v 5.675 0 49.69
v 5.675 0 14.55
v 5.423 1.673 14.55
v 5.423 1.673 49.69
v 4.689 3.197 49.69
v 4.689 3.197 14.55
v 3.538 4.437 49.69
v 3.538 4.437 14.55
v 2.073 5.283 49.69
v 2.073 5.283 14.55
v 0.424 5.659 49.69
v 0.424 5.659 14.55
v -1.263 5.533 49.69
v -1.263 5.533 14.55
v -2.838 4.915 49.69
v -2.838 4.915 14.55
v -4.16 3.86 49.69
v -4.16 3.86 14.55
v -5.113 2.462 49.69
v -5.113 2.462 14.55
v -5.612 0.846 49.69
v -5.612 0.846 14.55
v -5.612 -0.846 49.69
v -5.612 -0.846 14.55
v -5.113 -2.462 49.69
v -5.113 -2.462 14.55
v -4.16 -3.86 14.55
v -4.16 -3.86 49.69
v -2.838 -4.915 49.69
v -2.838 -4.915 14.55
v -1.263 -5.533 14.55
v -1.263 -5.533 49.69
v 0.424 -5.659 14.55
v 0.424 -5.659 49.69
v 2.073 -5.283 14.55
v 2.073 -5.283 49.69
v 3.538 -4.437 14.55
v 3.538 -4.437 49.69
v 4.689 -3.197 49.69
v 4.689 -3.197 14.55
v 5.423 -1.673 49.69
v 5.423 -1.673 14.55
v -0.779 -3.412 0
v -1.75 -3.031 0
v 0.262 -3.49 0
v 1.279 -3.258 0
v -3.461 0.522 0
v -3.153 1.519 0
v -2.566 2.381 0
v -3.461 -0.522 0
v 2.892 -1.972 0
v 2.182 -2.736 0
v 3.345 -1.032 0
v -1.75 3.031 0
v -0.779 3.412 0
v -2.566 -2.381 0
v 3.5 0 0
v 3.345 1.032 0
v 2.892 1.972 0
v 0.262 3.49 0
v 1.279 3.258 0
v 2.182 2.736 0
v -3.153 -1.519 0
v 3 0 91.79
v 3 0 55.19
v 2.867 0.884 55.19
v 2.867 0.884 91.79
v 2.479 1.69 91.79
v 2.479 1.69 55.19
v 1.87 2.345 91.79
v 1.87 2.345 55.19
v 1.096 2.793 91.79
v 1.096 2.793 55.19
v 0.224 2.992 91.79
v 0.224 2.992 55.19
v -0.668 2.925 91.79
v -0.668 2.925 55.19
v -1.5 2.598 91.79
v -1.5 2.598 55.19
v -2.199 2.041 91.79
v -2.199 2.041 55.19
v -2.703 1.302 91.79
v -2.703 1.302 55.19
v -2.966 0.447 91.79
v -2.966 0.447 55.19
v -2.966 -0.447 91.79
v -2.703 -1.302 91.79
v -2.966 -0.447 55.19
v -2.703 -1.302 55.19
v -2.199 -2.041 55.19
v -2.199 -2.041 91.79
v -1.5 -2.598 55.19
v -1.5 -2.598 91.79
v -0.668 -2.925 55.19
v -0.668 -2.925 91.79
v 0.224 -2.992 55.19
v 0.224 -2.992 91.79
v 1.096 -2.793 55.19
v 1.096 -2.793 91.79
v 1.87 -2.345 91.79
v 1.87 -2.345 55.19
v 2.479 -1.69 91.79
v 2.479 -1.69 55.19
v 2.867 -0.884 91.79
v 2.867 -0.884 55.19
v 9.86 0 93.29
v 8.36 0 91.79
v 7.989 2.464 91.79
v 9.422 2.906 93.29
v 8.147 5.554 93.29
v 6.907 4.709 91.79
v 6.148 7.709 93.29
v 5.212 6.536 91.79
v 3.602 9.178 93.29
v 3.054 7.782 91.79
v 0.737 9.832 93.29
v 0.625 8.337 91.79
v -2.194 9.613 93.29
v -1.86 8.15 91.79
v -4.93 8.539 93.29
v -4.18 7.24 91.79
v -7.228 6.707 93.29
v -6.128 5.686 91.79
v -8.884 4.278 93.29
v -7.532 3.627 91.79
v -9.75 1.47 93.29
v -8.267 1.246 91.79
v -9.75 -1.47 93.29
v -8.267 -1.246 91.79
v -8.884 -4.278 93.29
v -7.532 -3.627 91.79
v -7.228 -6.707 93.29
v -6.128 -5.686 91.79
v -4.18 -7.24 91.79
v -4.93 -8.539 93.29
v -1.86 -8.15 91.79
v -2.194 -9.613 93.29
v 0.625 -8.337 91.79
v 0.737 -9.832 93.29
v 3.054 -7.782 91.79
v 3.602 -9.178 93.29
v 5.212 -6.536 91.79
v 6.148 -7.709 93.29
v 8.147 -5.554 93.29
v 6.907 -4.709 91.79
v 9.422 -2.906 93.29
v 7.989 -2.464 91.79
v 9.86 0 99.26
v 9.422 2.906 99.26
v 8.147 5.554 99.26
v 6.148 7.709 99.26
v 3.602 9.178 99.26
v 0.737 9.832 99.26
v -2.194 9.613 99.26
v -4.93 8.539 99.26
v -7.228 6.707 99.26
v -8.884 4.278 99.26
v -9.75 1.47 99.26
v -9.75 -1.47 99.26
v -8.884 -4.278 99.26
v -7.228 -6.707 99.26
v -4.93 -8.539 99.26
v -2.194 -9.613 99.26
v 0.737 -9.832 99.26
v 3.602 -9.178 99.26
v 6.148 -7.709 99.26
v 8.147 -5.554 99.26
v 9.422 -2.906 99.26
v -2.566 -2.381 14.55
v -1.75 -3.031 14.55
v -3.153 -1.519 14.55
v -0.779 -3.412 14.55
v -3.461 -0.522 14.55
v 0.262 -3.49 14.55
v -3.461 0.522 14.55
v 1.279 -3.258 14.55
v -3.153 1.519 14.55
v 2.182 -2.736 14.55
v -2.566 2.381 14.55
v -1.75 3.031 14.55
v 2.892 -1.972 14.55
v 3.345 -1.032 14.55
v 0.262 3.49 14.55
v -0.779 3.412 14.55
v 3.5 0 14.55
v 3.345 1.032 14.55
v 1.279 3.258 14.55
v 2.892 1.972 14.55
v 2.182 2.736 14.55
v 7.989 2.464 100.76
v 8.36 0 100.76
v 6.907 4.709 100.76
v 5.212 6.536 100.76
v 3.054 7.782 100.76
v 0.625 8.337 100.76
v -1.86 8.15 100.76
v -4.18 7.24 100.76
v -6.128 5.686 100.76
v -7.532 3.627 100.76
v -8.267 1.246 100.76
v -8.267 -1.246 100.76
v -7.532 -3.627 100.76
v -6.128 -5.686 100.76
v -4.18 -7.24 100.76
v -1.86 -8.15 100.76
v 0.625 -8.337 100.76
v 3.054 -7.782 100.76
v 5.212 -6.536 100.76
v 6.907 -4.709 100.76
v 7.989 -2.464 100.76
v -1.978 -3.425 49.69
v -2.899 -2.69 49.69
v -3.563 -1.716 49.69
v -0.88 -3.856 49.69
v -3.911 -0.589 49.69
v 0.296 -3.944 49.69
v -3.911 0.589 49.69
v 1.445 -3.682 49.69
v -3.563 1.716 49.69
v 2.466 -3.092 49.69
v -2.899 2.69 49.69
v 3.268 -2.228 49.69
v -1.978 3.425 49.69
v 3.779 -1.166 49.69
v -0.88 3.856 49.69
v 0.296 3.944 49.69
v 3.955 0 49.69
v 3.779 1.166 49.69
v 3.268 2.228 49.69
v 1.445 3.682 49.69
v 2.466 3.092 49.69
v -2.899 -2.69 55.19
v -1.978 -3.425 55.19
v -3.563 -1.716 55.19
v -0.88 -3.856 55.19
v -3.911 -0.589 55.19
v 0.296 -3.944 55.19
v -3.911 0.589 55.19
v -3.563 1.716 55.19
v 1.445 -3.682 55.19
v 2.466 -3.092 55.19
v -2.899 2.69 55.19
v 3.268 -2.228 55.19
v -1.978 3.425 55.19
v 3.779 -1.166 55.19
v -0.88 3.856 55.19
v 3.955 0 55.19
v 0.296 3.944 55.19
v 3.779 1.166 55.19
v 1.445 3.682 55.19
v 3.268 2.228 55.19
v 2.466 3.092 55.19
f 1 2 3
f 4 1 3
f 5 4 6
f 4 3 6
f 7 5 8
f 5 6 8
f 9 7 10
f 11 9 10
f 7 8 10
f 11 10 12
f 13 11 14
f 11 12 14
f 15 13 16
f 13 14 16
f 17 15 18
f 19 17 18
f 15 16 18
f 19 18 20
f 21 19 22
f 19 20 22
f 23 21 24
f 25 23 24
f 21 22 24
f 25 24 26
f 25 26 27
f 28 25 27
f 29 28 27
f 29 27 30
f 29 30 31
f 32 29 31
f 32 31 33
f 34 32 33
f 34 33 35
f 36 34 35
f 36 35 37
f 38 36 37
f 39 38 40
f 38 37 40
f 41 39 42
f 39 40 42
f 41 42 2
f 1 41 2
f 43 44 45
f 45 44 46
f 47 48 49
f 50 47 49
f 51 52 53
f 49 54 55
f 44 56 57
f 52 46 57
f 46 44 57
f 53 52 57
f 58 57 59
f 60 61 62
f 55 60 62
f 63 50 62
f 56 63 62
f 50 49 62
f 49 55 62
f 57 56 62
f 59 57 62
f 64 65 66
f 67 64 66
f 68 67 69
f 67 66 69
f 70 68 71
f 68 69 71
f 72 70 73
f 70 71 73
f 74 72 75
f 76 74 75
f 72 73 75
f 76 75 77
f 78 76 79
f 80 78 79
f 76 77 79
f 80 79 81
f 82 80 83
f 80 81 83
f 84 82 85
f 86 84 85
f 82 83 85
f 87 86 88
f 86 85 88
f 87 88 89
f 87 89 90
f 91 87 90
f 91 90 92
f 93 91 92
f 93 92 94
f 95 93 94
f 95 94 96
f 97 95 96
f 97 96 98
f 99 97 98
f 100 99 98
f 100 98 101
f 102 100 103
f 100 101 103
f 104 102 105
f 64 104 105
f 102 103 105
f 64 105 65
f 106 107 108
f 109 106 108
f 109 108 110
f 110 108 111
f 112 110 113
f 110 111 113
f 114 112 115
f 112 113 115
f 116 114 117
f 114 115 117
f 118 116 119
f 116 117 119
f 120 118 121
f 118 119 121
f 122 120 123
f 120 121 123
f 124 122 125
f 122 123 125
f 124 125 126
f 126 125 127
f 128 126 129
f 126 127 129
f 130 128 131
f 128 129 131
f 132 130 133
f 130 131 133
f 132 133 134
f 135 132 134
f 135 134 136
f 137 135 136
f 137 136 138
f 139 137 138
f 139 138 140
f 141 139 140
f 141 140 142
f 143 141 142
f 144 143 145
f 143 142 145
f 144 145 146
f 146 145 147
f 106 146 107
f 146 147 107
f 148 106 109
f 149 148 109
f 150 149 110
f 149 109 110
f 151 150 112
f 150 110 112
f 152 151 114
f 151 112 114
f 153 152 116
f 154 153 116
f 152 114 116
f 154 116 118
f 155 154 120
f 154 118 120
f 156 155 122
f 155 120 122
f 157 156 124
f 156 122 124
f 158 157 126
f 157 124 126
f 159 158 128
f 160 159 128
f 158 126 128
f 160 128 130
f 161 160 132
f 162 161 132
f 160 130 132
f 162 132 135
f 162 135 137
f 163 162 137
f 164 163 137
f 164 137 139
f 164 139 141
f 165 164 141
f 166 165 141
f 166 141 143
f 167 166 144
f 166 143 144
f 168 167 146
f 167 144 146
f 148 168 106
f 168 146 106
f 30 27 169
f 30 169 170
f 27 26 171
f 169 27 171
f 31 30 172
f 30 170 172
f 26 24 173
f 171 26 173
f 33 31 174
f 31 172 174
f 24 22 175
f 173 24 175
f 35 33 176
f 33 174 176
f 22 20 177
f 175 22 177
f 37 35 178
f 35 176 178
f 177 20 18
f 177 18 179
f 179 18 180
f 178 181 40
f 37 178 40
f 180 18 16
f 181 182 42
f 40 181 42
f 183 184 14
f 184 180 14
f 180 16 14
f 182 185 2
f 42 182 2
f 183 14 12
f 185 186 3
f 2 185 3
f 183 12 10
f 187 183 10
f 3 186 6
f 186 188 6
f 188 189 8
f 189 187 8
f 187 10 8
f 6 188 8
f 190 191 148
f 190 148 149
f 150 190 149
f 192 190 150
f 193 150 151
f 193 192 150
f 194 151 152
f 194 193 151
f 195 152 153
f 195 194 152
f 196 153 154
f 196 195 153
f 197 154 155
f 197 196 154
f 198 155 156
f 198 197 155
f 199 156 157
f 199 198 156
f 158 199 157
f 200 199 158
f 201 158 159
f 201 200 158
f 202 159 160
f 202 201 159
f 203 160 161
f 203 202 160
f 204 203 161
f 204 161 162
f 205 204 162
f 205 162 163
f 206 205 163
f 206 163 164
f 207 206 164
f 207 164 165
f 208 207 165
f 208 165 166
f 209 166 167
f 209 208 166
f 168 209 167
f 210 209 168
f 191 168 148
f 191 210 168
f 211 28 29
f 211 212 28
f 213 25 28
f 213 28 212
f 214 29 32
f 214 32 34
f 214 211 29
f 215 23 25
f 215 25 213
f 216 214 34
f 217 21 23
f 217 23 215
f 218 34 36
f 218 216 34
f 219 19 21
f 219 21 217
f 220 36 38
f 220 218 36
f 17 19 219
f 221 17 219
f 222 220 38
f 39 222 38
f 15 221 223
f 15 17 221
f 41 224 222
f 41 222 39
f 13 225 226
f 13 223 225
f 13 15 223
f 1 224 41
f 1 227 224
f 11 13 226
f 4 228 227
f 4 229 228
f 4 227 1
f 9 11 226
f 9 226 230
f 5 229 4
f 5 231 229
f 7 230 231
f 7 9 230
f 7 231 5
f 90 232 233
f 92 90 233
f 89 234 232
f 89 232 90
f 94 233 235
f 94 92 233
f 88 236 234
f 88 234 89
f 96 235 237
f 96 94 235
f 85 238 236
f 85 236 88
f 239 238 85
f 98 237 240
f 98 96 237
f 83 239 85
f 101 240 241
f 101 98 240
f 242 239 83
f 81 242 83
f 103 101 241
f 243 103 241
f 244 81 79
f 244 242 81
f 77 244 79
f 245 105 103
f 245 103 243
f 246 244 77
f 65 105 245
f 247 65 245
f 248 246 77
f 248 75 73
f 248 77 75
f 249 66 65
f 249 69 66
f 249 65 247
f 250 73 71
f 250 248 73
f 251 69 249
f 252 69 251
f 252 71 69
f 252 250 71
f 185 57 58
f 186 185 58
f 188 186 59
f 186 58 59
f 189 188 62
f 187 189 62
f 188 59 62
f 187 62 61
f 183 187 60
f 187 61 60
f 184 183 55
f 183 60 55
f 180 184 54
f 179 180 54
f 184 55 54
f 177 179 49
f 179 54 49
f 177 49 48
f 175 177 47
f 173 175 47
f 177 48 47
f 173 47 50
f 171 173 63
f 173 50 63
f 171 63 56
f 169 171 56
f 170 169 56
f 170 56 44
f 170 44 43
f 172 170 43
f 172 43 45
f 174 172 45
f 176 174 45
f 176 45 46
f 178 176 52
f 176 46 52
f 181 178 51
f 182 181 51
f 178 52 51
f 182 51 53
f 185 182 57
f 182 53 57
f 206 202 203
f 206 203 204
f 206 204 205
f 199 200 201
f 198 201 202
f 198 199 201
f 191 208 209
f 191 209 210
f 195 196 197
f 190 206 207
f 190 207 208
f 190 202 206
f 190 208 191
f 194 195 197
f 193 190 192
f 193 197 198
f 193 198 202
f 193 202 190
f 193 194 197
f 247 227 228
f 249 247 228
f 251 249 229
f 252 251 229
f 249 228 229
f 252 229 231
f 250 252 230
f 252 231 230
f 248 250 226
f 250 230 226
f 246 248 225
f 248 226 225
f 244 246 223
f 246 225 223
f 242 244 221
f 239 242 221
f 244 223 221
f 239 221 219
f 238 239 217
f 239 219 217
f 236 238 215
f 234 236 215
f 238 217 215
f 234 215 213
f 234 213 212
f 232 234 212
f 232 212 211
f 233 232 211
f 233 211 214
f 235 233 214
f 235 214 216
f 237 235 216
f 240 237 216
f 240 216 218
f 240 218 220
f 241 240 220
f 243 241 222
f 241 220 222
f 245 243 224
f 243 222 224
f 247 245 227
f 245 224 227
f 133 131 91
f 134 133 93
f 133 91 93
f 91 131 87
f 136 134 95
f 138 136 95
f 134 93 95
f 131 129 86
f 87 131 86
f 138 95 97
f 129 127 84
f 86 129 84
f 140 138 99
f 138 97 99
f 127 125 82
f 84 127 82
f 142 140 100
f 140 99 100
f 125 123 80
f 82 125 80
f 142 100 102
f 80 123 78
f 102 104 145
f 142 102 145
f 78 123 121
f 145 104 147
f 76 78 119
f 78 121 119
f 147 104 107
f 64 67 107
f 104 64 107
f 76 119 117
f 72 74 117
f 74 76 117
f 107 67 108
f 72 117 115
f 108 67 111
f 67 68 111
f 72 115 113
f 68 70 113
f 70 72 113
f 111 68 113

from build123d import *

# Parameters (mm, degrees)
SKETCH1_R           = 3.5
BOSS_EXTRUDE1_DEPTH = 14.55
SKETCH2_R           = 5.675
BOSS_EXTRUDE2_DEPTH = 35.14
SKETCH3_R           = 3.955
BOSS_EXTRUDE3_DEPTH = 5.5
SKETCH4_R           = 3
BOSS_EXTRUDE4_DEPTH = 36.6
SKETCH5_R           = 9.86
BOSS_EXTRUDE5_DEPTH = 8.97
CHAMFER1_SIZE       = 1.5


with BuildPart() as part:
    # Sketch1 → Boss-Extrude1 (new body)
    with BuildSketch(Plane.XY):
        Circle(SKETCH1_R)
    extrude(amount=BOSS_EXTRUDE1_DEPTH)

    # Sketch2 → Boss-Extrude2 (add)
    with BuildSketch(Plane.XY.offset(14.55)):
        Circle(SKETCH2_R)
    extrude(amount=BOSS_EXTRUDE2_DEPTH)

    # Sketch3 → Boss-Extrude3 (add)
    with BuildSketch(Plane.XY.offset(49.69)):
        Circle(SKETCH3_R)
    extrude(amount=BOSS_EXTRUDE3_DEPTH)

    # Sketch4 → Boss-Extrude4 (add)
    with BuildSketch(Plane.XY.offset(55.19)):
        Circle(SKETCH4_R)
    extrude(amount=BOSS_EXTRUDE4_DEPTH)

    # Sketch5 → Boss-Extrude5 (add)
    with BuildSketch(Plane.XY.offset(91.79)):
        Circle(SKETCH5_R)
    extrude(amount=BOSS_EXTRUDE5_DEPTH)

    # Chamfer1
    chamfer1_edges = [part.edges().sort_by_distance(p)[0] for p in [
        (-9.86, 0, 91.79),
        (-9.86, 0, 100.76),
    ]]
    chamfer(chamfer1_edges, length=CHAMFER1_SIZE)


solid = part.part
